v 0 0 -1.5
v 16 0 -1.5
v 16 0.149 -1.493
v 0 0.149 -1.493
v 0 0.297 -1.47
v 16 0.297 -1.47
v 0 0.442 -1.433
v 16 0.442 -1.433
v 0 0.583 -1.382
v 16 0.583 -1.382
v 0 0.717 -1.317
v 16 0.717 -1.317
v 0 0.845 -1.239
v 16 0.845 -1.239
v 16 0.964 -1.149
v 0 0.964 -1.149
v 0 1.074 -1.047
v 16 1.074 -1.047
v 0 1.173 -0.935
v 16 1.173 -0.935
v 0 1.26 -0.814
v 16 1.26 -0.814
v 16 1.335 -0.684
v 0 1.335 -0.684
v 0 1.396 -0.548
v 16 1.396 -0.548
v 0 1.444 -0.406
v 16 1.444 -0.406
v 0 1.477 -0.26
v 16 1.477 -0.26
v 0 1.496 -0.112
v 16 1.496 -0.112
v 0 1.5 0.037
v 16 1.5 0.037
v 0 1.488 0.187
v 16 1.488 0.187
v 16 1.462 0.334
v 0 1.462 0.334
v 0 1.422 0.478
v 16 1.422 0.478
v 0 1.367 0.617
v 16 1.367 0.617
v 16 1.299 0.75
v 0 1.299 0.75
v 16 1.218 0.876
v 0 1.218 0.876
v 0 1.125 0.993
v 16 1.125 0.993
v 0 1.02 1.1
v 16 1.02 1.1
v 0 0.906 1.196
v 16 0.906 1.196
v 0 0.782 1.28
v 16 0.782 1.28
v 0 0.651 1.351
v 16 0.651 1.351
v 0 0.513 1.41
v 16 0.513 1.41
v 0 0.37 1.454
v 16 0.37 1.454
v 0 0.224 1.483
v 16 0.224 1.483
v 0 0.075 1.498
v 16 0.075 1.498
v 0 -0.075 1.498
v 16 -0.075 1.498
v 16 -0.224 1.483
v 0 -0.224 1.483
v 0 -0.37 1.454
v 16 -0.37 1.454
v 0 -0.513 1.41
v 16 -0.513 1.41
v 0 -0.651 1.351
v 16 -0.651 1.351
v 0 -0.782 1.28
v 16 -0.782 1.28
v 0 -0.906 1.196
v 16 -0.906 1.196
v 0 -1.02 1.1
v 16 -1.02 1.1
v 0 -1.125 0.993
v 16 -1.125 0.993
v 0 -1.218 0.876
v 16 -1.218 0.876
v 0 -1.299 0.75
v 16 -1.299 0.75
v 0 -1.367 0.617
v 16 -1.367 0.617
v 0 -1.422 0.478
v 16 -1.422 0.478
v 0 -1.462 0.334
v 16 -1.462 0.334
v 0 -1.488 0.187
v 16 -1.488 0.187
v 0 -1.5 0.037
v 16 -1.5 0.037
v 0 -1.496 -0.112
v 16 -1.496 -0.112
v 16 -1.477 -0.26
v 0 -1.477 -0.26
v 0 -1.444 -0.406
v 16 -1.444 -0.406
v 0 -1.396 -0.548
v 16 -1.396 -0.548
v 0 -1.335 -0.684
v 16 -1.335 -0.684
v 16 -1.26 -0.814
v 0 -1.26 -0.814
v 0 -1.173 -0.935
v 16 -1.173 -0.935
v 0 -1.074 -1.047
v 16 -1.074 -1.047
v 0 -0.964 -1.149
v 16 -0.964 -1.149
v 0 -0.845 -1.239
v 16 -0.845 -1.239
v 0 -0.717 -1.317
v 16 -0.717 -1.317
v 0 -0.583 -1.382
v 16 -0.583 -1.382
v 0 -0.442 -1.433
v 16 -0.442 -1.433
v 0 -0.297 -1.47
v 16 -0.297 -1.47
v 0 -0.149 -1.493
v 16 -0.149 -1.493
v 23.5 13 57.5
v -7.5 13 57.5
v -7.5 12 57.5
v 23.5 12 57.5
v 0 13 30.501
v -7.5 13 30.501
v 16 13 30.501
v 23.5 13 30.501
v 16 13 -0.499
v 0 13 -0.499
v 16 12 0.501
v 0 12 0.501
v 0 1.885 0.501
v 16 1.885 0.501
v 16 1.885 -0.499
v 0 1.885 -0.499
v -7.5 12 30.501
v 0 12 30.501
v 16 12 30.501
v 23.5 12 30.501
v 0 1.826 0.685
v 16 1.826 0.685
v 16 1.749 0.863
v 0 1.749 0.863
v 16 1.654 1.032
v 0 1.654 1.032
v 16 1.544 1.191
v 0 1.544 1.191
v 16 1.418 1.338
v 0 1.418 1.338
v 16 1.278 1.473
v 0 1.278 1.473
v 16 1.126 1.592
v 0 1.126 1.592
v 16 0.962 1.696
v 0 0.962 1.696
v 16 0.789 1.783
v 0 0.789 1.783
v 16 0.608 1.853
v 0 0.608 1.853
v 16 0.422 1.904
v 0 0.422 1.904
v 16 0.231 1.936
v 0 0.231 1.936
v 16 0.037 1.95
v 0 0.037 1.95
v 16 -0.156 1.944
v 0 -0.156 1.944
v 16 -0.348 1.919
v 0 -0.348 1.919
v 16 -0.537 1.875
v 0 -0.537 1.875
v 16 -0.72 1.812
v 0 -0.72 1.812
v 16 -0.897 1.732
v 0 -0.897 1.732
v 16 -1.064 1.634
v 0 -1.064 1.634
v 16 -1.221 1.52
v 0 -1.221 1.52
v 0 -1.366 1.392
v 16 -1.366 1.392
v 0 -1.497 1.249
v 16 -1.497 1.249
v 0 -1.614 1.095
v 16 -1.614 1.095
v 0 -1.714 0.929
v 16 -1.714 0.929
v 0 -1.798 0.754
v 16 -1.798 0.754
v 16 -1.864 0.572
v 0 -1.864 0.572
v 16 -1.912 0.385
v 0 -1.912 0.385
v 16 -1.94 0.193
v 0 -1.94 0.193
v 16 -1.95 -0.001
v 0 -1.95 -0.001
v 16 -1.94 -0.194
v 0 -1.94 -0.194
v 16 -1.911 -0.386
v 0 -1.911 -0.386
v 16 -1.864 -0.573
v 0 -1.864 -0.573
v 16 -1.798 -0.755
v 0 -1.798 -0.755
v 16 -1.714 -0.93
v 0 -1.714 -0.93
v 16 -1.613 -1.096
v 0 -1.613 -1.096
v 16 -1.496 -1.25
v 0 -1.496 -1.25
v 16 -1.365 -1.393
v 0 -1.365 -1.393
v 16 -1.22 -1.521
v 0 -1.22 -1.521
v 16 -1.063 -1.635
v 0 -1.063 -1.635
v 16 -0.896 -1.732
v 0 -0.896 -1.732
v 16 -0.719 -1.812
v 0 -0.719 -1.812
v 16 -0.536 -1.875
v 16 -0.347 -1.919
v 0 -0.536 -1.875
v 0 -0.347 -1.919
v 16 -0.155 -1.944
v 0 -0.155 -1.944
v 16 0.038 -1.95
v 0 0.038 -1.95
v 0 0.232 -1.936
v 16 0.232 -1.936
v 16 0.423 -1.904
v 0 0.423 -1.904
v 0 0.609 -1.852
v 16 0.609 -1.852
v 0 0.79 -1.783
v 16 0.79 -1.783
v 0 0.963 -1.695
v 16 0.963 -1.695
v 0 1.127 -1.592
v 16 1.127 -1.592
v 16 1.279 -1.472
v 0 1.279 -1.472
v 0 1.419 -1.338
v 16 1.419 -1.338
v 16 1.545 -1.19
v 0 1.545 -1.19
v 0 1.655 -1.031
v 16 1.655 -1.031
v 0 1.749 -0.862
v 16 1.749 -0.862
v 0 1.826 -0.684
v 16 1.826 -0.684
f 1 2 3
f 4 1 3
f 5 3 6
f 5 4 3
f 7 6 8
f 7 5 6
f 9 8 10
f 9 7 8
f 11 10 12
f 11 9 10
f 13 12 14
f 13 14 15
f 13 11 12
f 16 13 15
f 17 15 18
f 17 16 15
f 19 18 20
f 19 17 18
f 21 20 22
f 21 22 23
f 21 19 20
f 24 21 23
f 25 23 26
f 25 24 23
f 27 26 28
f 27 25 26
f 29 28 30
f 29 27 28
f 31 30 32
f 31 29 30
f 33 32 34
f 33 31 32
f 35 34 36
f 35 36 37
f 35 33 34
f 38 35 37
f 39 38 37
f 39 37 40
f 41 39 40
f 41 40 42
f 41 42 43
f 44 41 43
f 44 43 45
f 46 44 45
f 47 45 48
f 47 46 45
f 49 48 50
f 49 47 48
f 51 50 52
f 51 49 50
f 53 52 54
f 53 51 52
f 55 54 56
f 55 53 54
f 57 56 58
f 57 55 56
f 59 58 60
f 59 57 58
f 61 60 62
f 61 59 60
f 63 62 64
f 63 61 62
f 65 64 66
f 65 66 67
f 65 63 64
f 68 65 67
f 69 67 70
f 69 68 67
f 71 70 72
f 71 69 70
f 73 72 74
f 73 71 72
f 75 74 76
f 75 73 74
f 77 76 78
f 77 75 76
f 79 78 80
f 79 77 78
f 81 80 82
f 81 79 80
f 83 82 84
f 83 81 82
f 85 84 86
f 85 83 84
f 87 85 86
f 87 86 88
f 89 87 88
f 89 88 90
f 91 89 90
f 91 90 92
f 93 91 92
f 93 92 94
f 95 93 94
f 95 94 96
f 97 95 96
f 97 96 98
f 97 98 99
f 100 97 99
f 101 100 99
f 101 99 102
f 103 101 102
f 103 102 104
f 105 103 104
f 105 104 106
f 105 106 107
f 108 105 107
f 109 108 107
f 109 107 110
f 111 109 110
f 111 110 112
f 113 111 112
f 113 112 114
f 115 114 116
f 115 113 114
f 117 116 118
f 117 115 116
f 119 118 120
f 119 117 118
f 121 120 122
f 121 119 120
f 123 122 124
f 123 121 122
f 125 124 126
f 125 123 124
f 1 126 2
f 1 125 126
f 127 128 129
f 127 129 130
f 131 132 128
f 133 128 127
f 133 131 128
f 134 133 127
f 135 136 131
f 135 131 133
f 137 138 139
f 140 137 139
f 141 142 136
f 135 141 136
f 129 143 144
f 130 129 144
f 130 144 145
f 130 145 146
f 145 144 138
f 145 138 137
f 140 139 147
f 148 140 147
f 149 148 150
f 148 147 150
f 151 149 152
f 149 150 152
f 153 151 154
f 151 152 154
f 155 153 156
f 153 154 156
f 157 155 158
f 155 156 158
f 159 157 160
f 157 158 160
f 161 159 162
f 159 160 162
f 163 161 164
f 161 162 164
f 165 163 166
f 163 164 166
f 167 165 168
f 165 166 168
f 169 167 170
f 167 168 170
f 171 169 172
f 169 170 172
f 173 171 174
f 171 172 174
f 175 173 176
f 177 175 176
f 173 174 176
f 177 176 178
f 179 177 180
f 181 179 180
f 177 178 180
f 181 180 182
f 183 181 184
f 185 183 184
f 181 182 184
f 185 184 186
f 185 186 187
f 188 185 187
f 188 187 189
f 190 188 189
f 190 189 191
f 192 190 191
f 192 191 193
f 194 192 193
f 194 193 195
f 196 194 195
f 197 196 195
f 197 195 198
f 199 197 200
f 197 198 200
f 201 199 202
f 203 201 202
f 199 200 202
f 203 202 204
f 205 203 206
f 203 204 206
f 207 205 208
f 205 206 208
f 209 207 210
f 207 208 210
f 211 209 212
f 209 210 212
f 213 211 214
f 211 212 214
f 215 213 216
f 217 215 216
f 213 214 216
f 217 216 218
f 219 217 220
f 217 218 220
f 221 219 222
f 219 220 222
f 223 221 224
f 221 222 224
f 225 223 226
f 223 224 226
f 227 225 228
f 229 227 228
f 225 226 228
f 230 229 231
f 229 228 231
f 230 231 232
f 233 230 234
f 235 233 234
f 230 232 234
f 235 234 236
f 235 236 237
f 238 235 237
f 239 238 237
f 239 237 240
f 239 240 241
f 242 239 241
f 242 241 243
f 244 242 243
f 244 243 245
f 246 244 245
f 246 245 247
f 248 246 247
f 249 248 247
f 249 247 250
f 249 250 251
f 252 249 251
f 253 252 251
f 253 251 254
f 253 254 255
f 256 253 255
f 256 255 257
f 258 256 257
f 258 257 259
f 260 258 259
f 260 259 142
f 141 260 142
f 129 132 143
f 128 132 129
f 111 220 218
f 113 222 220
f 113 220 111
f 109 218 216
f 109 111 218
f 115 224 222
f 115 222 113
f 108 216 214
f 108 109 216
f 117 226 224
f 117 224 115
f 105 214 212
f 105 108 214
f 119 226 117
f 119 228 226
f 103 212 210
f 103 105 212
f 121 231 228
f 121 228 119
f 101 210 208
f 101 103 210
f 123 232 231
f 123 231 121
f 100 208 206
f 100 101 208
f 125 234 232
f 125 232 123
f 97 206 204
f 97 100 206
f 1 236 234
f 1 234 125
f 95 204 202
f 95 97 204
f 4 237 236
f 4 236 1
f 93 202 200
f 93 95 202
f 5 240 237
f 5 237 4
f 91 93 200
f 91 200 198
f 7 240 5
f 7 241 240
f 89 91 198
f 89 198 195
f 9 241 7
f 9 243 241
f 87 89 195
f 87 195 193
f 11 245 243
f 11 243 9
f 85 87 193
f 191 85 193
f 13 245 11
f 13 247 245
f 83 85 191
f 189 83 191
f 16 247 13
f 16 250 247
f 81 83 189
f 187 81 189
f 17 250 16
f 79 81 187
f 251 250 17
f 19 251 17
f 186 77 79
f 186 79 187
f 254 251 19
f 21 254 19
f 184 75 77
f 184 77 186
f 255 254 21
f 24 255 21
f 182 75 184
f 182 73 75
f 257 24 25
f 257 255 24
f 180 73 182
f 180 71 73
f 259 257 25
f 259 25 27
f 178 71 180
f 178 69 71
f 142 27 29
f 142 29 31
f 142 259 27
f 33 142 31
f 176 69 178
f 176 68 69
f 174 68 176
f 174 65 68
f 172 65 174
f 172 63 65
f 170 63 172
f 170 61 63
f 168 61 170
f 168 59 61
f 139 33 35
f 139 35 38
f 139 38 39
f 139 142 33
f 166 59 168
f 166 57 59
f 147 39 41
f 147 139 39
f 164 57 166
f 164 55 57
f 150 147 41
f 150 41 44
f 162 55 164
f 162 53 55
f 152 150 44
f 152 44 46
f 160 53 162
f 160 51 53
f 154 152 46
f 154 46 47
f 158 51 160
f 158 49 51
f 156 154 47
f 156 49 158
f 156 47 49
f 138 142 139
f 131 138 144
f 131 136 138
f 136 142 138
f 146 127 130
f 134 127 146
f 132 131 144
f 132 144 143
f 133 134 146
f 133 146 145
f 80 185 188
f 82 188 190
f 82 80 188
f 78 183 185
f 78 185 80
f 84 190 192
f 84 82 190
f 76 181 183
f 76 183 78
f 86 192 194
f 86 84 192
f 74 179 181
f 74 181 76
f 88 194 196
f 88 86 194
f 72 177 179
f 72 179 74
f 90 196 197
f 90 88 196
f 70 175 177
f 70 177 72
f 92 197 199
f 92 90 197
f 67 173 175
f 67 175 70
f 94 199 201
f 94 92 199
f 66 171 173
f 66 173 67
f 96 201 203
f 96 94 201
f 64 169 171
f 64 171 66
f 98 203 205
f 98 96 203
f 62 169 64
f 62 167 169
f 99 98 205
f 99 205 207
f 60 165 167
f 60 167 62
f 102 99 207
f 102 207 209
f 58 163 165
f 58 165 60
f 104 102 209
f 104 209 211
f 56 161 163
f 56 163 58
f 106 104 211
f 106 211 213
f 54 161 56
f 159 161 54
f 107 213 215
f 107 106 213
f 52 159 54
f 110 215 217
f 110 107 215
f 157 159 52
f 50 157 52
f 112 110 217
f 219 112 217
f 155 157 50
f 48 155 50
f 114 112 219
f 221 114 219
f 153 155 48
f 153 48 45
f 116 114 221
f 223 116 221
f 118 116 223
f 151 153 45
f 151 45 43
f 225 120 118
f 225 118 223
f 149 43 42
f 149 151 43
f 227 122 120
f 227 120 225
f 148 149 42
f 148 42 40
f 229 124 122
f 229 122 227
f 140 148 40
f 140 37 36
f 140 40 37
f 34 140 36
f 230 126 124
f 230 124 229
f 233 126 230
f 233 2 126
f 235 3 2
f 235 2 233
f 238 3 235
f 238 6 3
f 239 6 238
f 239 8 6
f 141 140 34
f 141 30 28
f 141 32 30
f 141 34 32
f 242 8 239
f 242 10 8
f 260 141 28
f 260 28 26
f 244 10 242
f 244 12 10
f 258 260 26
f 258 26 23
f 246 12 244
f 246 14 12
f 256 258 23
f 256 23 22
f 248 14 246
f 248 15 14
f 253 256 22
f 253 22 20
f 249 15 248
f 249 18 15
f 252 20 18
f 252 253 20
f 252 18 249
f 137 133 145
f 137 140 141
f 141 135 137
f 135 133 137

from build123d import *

# Parameters (mm, degrees)
SKETCH1_R           = 1.5
BOSS_EXTRUDE1_DEPTH = 16
BOSS_EXTRUDE2_DEPTH = 1


with BuildPart() as part:
    # Sketch1 → Boss-Extrude1 (new body)
    with BuildSketch(Plane(origin=(0, 0, 0), x_dir=(0, 0, -1), z_dir=(1, 0, 0))):
        with BuildLine():
            Line((0.49946551, 12.999886025), (-0.50053449, 12.999886025))
            Line((-0.50053449, 12.999886025), (-0.50053449, 1.884665812))
            ThreePointArc((-0.50053449, 1.884665812), (0.000552977, -1.949999922), (0.49946551, 1.88494939))
            Line((0.49946551, 1.88494939), (0.49946551, 12.999886025))
        make_face()
        Circle(SKETCH1_R, mode=Mode.SUBTRACT)
    extrude(amount=BOSS_EXTRUDE1_DEPTH)

    # Sketch2 → Boss-Extrude2 (add)
    with BuildSketch(Plane(origin=(0, 12.999886025, 0), x_dir=(1, 0, 0), z_dir=(0, 1, 0))):
        Polygon((16, -0.50053449), (0, -0.50053449), (0, -30.50053449), (-7.5, -30.50053449), (-7.5, -57.5), (23.5, -57.5), (23.5, -30.50053449), (16, -30.50053449), align=None)
    extrude(amount=-BOSS_EXTRUDE2_DEPTH)


solid = part.part
